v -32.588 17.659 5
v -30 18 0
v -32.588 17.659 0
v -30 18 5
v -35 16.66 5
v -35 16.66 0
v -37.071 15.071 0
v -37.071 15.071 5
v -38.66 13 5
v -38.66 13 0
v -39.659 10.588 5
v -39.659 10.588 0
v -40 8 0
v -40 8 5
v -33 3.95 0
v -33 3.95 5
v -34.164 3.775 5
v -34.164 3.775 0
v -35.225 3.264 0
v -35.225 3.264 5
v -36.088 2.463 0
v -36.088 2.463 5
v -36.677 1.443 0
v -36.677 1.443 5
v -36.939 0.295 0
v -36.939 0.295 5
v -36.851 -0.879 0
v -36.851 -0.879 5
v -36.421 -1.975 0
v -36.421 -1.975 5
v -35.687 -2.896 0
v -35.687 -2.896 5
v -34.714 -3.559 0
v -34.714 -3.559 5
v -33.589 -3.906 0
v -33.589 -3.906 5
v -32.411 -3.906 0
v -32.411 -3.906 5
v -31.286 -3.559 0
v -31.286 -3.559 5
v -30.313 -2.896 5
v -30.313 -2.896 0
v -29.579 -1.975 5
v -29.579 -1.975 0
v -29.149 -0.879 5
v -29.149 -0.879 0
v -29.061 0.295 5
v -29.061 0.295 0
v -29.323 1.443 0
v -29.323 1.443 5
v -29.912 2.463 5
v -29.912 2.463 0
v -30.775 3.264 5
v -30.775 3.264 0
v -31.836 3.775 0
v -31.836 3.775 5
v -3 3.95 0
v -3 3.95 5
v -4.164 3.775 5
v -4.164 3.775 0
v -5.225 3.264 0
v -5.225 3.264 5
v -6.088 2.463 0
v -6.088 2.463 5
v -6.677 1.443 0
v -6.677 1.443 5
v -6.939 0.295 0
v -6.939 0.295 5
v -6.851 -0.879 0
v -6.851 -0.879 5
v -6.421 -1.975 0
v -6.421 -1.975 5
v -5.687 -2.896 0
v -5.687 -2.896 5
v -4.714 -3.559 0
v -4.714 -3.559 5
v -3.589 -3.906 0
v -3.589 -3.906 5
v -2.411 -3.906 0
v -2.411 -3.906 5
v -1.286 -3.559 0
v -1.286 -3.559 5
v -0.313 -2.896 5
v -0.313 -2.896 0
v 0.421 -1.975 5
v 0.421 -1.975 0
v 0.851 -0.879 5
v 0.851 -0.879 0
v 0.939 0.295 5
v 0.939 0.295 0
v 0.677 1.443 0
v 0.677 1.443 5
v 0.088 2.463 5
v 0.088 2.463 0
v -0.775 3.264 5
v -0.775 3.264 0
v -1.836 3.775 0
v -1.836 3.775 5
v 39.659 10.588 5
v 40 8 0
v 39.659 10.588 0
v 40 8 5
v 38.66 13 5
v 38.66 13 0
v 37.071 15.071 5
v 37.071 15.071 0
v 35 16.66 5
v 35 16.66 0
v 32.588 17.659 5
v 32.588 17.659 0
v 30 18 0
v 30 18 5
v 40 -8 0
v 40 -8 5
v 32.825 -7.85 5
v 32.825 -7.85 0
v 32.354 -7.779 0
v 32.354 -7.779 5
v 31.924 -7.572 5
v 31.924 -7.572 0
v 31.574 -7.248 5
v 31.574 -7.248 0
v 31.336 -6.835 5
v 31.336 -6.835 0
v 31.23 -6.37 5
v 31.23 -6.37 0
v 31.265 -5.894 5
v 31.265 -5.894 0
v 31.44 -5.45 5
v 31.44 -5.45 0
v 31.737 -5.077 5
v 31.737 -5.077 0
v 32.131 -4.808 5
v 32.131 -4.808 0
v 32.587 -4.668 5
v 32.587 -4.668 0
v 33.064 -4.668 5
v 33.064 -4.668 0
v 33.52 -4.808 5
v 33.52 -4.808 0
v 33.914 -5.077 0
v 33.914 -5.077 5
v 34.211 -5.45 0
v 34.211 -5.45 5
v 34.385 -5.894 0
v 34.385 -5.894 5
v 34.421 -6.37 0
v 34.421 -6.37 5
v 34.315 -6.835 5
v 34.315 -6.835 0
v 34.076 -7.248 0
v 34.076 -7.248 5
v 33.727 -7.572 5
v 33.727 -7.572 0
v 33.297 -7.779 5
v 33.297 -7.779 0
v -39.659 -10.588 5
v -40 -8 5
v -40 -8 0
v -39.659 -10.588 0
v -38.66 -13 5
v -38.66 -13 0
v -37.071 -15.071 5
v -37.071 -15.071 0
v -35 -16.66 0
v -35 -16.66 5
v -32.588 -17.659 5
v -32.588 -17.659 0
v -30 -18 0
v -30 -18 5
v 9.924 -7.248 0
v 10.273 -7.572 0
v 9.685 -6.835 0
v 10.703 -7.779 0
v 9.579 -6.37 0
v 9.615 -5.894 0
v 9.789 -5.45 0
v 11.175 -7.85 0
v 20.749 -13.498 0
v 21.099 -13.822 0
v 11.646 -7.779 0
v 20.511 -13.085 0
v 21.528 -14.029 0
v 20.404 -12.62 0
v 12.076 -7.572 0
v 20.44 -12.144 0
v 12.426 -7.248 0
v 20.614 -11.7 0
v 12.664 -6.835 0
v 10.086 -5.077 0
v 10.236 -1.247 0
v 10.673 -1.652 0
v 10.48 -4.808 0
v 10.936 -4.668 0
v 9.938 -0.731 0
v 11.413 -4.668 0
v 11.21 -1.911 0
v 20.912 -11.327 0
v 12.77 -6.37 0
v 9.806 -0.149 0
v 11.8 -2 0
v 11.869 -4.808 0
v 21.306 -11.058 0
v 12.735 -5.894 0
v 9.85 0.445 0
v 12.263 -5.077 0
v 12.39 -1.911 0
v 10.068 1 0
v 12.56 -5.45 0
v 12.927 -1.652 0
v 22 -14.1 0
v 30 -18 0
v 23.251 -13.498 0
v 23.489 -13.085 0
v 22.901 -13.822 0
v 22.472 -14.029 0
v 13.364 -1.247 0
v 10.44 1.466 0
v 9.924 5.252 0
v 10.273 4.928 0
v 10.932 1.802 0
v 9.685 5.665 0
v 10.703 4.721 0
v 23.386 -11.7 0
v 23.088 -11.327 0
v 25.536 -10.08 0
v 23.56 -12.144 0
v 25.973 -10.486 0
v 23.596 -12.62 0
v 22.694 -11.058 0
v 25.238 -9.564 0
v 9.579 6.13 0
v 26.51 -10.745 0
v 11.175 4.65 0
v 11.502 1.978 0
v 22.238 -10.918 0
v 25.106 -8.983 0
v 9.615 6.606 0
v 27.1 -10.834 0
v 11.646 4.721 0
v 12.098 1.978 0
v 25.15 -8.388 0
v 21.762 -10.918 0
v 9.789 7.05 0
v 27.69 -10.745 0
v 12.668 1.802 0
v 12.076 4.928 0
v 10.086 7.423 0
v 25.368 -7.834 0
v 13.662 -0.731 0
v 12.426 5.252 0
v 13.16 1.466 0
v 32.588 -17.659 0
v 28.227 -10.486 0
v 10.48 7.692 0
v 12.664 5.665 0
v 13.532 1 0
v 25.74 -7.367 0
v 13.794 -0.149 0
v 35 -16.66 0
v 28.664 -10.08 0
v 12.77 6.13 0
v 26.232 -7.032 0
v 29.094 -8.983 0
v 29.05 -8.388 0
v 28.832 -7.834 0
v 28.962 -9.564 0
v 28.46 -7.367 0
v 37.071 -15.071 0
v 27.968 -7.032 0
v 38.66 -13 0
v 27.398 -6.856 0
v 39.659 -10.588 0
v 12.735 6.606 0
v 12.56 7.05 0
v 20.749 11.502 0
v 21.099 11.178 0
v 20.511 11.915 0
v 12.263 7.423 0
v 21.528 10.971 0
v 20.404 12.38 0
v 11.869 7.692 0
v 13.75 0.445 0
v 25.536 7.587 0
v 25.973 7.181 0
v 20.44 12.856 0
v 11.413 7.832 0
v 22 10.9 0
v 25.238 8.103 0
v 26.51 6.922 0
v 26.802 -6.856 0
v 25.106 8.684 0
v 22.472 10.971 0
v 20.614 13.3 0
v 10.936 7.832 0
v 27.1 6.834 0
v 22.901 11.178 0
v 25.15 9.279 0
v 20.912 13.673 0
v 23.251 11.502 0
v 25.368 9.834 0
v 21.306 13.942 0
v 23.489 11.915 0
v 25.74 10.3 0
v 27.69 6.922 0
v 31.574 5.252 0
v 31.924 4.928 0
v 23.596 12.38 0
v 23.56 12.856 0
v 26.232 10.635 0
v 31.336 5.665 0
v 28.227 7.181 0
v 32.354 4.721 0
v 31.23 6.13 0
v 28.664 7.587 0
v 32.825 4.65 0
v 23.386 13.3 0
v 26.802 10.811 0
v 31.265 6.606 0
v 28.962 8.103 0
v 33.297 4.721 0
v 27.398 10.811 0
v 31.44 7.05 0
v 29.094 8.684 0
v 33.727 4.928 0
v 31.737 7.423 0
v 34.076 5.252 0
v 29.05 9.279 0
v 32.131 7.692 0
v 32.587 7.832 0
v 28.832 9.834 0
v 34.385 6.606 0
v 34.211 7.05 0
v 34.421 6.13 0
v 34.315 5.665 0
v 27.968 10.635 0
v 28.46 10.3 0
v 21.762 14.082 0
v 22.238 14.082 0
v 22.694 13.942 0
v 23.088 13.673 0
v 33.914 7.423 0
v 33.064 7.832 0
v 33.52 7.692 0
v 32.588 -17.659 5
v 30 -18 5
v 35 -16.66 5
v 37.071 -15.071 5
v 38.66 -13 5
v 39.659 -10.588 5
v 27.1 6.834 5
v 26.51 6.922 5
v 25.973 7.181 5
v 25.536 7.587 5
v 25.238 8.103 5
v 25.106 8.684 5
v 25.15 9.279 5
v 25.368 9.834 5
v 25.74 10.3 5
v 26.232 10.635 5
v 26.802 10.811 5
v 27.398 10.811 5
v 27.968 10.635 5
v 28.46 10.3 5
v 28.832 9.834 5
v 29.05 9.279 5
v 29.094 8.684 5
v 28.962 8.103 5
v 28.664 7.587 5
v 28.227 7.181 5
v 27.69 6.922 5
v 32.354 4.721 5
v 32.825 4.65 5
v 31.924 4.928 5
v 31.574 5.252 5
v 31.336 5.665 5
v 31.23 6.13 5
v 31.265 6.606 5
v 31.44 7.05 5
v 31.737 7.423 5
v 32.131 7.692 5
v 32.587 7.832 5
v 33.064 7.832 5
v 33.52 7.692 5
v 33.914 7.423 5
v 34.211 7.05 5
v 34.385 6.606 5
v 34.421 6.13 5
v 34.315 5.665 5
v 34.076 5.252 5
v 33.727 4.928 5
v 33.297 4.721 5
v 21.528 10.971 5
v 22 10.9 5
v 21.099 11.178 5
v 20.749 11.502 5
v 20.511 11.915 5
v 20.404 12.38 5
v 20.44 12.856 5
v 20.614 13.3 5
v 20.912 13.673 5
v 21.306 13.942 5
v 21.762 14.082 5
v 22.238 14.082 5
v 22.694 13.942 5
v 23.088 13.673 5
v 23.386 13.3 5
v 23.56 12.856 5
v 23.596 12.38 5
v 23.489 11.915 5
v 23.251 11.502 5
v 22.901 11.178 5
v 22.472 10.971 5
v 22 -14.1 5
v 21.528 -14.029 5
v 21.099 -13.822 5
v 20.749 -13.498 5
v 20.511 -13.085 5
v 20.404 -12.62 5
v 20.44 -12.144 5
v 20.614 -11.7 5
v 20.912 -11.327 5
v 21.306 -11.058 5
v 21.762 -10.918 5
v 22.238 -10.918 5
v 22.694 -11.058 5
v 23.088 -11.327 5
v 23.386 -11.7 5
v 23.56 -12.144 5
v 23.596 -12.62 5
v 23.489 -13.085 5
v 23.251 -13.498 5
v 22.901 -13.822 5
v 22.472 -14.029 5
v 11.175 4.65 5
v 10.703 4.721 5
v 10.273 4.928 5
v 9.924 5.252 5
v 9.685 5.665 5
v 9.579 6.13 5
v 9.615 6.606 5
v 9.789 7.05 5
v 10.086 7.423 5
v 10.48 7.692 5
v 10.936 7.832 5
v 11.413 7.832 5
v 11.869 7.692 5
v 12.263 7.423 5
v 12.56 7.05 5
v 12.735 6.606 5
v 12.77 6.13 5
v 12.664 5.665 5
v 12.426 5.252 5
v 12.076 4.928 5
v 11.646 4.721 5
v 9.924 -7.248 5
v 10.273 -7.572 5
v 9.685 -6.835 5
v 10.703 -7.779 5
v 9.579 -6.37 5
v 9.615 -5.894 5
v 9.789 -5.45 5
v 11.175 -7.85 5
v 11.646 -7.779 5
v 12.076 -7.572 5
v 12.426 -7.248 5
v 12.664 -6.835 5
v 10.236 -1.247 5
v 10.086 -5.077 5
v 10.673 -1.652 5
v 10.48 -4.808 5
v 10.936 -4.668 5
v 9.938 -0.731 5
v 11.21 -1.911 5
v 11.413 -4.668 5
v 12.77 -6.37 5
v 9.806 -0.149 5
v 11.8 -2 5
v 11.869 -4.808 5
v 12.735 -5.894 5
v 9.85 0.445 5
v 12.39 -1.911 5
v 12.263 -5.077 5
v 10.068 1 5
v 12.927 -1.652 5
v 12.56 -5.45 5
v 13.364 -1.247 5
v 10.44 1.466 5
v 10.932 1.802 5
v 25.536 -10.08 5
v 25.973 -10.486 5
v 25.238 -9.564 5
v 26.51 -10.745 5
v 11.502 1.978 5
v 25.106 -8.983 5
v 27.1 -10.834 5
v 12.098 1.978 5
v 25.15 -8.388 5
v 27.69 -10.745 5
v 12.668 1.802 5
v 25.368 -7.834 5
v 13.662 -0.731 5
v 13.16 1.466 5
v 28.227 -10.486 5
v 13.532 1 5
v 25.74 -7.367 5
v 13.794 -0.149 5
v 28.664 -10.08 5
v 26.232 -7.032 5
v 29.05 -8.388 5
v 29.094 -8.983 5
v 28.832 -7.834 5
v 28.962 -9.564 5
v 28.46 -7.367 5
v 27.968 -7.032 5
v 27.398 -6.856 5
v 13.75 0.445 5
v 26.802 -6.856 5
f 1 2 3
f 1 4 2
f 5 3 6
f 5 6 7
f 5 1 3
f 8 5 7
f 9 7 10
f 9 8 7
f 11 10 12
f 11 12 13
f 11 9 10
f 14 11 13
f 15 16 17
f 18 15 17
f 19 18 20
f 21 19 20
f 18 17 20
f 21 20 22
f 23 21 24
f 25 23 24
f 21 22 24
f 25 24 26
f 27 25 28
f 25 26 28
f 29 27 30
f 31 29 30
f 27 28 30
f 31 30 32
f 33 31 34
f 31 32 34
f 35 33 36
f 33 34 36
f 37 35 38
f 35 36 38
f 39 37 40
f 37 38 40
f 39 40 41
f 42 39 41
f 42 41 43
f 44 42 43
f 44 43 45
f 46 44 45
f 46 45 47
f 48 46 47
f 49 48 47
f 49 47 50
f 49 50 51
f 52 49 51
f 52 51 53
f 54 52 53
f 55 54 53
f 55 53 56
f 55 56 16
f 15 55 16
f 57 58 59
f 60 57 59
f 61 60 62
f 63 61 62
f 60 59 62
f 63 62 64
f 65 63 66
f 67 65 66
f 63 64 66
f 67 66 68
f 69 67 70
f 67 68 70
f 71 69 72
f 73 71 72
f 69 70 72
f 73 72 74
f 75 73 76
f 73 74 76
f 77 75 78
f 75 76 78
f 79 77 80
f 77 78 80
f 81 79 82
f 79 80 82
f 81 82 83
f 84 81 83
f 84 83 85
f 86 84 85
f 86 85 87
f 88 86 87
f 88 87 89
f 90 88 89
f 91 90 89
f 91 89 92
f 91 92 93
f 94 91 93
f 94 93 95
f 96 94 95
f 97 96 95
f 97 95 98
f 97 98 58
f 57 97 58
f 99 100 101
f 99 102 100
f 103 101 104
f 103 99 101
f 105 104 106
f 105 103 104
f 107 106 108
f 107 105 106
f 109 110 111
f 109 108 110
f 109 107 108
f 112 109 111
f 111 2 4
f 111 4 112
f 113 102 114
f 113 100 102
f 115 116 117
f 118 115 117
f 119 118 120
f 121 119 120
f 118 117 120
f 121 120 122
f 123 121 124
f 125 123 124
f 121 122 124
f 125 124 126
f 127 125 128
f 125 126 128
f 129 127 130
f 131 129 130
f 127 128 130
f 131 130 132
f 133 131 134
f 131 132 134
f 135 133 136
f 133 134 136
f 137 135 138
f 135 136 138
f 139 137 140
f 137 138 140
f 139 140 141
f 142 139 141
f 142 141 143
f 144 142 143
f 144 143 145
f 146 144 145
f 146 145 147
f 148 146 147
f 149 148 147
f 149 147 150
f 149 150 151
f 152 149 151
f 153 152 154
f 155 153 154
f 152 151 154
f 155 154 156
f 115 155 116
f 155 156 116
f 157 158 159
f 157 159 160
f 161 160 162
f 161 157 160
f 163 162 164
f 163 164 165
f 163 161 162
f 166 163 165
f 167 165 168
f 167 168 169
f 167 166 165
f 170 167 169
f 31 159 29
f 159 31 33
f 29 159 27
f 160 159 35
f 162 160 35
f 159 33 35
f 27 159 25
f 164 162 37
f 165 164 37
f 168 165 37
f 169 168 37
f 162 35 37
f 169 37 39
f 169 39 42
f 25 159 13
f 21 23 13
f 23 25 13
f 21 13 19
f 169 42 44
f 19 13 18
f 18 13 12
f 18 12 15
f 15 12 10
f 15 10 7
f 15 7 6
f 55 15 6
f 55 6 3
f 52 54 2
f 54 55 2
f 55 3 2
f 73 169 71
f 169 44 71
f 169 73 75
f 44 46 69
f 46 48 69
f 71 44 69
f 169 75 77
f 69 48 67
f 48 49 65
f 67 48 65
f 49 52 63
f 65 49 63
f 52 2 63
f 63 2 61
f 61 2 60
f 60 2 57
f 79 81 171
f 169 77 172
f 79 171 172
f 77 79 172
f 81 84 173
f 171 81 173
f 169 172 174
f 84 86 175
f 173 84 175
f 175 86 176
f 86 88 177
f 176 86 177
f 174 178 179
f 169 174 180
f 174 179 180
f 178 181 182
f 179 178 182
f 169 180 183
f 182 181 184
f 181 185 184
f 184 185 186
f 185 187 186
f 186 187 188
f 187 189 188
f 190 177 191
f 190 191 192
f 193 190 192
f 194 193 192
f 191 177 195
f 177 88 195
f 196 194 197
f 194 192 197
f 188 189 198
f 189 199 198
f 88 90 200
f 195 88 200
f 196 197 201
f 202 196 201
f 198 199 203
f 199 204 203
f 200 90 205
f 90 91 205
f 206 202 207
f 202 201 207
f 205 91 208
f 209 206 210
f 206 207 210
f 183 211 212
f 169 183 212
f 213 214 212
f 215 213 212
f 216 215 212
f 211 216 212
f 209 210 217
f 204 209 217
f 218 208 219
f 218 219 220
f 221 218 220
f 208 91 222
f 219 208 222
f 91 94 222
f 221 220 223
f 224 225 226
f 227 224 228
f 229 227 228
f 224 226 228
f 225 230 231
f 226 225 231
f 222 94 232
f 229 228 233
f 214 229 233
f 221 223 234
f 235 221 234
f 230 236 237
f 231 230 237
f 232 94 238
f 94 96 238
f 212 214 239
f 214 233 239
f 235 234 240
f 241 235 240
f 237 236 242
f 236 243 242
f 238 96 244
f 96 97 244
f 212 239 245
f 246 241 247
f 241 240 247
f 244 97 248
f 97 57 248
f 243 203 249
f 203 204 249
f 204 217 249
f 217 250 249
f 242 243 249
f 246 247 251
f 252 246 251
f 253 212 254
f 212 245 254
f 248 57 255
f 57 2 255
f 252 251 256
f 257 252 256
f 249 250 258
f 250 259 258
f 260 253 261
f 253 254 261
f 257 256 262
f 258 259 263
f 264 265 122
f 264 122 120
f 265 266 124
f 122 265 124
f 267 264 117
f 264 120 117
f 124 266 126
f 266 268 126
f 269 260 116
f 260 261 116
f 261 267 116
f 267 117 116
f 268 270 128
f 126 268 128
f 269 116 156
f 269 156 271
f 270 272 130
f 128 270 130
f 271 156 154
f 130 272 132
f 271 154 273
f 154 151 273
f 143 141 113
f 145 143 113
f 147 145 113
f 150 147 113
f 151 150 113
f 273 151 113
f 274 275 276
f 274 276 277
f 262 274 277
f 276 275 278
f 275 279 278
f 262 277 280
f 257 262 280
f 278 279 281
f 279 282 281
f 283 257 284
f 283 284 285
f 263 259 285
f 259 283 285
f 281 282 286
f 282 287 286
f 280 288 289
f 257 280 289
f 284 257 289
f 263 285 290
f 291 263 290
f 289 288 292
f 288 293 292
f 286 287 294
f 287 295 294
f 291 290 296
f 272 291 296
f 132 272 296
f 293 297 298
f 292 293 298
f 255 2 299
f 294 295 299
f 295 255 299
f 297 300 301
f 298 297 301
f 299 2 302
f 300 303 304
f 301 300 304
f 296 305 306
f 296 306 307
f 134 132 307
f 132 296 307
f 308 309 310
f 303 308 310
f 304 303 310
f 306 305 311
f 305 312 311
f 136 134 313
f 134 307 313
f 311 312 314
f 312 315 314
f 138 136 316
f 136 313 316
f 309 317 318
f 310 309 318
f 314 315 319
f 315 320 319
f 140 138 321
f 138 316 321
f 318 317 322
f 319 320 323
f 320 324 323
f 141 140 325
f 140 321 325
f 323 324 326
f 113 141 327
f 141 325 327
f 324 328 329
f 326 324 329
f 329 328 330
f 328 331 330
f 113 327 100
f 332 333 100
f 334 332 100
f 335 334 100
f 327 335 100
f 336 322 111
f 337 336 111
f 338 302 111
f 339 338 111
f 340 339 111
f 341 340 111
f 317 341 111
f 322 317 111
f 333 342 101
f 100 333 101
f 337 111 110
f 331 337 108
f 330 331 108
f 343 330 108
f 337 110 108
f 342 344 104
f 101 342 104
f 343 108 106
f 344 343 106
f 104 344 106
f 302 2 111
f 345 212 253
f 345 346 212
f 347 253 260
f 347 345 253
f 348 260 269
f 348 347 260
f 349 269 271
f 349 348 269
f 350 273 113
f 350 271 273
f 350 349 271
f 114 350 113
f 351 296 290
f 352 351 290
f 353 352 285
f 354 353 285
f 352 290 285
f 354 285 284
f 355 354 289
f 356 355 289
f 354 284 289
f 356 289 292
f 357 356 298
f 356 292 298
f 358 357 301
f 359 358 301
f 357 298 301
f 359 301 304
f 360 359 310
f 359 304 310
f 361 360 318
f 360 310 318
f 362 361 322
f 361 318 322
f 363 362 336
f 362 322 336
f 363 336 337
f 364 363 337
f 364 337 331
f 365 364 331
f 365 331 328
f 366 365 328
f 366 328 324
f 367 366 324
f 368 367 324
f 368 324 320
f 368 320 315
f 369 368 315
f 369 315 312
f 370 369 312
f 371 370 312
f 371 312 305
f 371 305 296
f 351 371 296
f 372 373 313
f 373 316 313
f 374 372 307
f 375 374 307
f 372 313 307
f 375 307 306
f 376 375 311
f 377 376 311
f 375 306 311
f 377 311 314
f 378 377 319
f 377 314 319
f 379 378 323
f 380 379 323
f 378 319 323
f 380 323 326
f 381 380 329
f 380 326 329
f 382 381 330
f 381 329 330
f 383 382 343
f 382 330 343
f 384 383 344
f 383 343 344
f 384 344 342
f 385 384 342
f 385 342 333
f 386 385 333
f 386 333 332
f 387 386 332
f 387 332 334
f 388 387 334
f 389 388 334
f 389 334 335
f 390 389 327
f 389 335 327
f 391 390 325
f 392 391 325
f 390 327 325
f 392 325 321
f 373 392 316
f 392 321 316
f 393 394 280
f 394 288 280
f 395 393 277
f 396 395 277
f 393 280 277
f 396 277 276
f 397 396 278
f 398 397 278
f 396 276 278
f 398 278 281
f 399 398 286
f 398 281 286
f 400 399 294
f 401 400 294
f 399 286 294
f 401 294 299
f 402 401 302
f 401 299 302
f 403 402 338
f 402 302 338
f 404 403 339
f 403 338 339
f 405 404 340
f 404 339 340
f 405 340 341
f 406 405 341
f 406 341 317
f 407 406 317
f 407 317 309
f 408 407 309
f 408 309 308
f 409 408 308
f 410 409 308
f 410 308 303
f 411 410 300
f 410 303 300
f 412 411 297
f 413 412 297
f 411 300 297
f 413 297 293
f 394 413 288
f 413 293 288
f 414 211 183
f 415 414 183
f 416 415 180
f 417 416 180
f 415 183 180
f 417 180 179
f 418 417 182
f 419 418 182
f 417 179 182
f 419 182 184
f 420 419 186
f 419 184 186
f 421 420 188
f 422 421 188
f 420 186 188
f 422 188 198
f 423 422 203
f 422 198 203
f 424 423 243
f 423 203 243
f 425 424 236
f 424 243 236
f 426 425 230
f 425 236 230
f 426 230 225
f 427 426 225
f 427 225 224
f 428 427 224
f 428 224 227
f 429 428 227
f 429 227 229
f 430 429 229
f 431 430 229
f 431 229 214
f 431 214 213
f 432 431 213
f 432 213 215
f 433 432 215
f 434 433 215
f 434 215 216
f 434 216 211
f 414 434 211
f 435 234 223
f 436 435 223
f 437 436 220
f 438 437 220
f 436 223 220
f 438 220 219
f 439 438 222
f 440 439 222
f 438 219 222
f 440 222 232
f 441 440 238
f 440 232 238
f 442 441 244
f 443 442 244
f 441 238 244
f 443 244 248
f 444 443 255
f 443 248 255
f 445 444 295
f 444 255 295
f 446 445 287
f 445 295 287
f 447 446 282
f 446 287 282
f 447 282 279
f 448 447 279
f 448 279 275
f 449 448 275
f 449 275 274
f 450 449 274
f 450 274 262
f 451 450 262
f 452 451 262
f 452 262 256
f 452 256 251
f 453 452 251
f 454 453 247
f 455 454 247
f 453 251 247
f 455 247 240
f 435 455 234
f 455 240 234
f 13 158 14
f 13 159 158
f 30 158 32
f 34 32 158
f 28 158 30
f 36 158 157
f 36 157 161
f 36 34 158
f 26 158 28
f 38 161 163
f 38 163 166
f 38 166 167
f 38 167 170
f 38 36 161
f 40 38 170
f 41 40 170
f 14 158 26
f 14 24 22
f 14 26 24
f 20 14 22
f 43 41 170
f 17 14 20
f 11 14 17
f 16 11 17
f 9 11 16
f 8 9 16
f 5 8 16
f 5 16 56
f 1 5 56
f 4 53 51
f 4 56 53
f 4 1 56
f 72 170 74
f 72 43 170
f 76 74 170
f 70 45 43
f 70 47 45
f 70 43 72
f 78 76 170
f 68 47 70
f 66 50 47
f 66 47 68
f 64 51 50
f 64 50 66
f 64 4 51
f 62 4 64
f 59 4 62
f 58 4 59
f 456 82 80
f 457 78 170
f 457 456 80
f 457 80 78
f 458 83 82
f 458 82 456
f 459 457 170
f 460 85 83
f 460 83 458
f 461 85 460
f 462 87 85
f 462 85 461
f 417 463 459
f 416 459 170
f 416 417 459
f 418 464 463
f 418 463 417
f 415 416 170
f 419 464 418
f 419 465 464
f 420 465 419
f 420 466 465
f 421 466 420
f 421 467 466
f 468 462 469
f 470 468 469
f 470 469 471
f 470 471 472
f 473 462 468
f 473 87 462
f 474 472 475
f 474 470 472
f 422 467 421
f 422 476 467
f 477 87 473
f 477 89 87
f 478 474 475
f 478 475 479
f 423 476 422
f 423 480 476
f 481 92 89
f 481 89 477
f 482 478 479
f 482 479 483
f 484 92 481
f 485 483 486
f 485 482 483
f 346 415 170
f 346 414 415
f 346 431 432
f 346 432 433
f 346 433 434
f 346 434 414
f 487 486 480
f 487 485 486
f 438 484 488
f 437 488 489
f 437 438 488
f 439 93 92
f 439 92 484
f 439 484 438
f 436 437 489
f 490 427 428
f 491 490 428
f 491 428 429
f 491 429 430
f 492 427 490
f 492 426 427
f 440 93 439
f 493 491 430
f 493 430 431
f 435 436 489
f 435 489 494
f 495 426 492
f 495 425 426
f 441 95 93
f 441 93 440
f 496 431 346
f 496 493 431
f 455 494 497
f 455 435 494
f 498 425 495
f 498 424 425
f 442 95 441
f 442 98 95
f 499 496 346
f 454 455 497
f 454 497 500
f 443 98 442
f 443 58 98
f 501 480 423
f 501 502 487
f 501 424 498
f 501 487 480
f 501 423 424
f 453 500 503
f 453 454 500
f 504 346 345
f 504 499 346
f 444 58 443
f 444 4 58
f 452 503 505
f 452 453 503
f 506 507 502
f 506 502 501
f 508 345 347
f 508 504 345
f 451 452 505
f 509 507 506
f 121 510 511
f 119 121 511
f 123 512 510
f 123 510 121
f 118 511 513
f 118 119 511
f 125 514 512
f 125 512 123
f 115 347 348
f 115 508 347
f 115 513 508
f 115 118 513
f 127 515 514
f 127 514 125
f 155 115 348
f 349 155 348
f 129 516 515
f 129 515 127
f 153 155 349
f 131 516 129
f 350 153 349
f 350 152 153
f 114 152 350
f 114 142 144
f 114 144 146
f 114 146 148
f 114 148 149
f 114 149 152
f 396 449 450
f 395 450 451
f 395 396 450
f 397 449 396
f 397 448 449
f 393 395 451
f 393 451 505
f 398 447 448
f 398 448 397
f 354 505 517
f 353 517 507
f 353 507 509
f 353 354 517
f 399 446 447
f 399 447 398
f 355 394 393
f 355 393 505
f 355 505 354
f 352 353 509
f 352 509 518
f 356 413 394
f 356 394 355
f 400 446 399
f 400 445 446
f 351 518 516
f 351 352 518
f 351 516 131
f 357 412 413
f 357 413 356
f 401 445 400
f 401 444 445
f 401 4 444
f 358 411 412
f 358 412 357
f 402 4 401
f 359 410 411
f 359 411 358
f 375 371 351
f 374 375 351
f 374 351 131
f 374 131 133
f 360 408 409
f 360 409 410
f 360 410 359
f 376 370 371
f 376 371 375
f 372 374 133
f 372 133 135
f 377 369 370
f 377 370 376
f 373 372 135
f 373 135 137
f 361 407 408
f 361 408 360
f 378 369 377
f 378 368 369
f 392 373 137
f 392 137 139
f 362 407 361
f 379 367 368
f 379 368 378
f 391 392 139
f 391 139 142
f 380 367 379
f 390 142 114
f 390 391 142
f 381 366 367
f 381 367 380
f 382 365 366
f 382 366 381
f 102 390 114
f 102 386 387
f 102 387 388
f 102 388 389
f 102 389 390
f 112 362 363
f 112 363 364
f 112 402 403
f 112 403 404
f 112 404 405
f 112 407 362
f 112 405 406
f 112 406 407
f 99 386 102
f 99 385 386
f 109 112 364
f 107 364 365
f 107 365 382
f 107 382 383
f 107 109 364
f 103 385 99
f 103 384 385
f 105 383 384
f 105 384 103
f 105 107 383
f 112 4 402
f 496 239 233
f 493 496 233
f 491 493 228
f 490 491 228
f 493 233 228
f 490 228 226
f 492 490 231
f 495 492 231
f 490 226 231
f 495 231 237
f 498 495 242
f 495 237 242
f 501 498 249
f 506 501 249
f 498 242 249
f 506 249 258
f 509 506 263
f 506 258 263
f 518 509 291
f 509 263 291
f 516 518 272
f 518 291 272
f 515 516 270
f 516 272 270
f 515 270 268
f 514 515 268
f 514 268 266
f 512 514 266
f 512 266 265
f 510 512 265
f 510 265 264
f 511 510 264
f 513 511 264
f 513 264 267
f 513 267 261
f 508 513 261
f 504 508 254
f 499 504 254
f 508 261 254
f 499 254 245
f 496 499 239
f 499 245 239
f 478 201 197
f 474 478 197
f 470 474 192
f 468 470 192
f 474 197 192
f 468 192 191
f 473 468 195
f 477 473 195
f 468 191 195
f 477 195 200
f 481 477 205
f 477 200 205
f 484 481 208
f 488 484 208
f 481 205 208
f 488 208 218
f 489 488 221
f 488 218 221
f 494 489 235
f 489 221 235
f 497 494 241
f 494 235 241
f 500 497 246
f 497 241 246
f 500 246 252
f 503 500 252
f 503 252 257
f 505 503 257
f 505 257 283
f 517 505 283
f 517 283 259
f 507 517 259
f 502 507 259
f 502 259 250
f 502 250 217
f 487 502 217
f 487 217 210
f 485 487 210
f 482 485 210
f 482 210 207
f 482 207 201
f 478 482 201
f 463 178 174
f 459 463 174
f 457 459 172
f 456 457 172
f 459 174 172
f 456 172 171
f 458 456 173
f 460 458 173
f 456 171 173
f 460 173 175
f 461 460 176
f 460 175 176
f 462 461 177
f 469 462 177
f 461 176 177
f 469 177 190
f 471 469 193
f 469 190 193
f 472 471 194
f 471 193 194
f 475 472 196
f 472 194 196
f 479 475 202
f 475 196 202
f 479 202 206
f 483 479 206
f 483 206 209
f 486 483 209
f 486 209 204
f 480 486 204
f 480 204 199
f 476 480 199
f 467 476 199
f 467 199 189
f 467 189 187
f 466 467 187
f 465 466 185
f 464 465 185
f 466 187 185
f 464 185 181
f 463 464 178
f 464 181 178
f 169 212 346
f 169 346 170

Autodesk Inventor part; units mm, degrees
ref_plane "YZ Plane" through (0, 0, 0) normal (1, 0, 0) x (0, 1, 0)
ref_plane "XZ Plane" through (0, 0, 0) normal (0, 1, 0) x (-1, 0, 0)
ref_plane "XY Plane" through (0, 0, 0) normal (0, 0, 1) x (1, 0, 0)
sketch "スケッチ1" plane through (0, 0, 0) normal (0, 0, 1) x (1, 0, 0)
  line L0 (-40, 18) -> (40, 18)
  line L1 (40, 18) -> (40, -18)
  line L2 (40, -18) -> (-40, -18)
  line L3 (-40, -18) -> (-40, 18)
  line L4 (0, 0) -> (0, 18) construction
  line L5 (0, 0) -> (40, 0) construction
  dimension "d0" = 36
  dimension "d1" = 80
extrude "プレート1" add sketch "スケッチ1" along normal blind 5
sketch "スケッチ2" plane through (0, 0, 5) normal (0, 0, 1) x (1, 0, 0)
  line L0 (40, 18) -> (40, -18) projected
  line L1 (-40, 18) -> (-40, -18) projected
  line L2 (-40, 0) -> (40, 0) construction
  point P0 (22, 0)
  point P1 (11.8, 0)
  point P2 (27.1, -8.8335)
  point P3 (27.1, 8.8335)
  dimension "d3" = 10.2
  dimension "d6" = 360
  dimension "d116" = 18
hole "穴1" at (11.8, 0, 5) at (27.1, -8.8335, 5) at (27.1, 8.8335, 5) direction (0, 0, -1) diameter 4 depth 5
sketch "スケッチ3" plane through (0, 0, 5) normal (0, 0, 1) x (1, 0, 0)
  line L0 (40, 18) -> (40, -18) projected
  point P0 (22, 0)
  point P1 (22, -12.5)
  point P2 (32.8253, -6.25)
  point P3 (32.8253, 6.25)
  point P4 (22, 12.5)
  point P5 (11.1747, 6.25)
  point P6 (11.1747, -6.25)
  dimension "d15" = 12.5
  dimension "d18" = 360
  dimension "d117" = 18
hole "穴2" at (22, -12.5, 5) at (32.8253, -6.25, 5) at (32.8253, 6.25, 5) at (22, 12.5, 5) at (11.1747, 6.25, 5) at (11.1747, -6.25, 5) direction (0, 0, -1) diameter 3.2 depth 5
sketch "スケッチ13" plane through (0, 0, 0) normal (0, 0, -1) x (-1, 0, 0)
  line L0 (0, 0) -> (40, 0) construction
  line L1 (40, -18) -> (40, 18) projected
  line L2 (-40, 18) -> (-40, -18) projected
  point P0 (33, 0)
  point P1 (3, 0)
  dimension "d127" = 30
  dimension "d128" = 43
hole "穴10" at (-33, 0, 0) at (-3, 0, 0) direction (0, 0, 1) diameter 7.9 depth 5
fillet "フィレット1" radius 10 4 edges at (40, -18, 2.5) (40, 18, 2.5) (-40, 18, 2.5) (-40, -18, 2.5)
equation "\"d13\" = d3"
equation "\"d125\" = Thickness"
equation "\"d2\" = Thickness"
equation "\"BendRadius\" = Thickness"
equation "\"BendReliefWidth\" = Thickness"
equation "\"BendReliefDepth\" = 0.5 * Thickness"
equation "\"TransitionRadius\" = BendRadius"
equation "\"JacobiRadiusSize\" = BendRadius"
equation "\"GapSize\" = Thickness"
equation "\"Thickness\" = 5"
properties part number "link_plate" material "アルミニウム 6061"
